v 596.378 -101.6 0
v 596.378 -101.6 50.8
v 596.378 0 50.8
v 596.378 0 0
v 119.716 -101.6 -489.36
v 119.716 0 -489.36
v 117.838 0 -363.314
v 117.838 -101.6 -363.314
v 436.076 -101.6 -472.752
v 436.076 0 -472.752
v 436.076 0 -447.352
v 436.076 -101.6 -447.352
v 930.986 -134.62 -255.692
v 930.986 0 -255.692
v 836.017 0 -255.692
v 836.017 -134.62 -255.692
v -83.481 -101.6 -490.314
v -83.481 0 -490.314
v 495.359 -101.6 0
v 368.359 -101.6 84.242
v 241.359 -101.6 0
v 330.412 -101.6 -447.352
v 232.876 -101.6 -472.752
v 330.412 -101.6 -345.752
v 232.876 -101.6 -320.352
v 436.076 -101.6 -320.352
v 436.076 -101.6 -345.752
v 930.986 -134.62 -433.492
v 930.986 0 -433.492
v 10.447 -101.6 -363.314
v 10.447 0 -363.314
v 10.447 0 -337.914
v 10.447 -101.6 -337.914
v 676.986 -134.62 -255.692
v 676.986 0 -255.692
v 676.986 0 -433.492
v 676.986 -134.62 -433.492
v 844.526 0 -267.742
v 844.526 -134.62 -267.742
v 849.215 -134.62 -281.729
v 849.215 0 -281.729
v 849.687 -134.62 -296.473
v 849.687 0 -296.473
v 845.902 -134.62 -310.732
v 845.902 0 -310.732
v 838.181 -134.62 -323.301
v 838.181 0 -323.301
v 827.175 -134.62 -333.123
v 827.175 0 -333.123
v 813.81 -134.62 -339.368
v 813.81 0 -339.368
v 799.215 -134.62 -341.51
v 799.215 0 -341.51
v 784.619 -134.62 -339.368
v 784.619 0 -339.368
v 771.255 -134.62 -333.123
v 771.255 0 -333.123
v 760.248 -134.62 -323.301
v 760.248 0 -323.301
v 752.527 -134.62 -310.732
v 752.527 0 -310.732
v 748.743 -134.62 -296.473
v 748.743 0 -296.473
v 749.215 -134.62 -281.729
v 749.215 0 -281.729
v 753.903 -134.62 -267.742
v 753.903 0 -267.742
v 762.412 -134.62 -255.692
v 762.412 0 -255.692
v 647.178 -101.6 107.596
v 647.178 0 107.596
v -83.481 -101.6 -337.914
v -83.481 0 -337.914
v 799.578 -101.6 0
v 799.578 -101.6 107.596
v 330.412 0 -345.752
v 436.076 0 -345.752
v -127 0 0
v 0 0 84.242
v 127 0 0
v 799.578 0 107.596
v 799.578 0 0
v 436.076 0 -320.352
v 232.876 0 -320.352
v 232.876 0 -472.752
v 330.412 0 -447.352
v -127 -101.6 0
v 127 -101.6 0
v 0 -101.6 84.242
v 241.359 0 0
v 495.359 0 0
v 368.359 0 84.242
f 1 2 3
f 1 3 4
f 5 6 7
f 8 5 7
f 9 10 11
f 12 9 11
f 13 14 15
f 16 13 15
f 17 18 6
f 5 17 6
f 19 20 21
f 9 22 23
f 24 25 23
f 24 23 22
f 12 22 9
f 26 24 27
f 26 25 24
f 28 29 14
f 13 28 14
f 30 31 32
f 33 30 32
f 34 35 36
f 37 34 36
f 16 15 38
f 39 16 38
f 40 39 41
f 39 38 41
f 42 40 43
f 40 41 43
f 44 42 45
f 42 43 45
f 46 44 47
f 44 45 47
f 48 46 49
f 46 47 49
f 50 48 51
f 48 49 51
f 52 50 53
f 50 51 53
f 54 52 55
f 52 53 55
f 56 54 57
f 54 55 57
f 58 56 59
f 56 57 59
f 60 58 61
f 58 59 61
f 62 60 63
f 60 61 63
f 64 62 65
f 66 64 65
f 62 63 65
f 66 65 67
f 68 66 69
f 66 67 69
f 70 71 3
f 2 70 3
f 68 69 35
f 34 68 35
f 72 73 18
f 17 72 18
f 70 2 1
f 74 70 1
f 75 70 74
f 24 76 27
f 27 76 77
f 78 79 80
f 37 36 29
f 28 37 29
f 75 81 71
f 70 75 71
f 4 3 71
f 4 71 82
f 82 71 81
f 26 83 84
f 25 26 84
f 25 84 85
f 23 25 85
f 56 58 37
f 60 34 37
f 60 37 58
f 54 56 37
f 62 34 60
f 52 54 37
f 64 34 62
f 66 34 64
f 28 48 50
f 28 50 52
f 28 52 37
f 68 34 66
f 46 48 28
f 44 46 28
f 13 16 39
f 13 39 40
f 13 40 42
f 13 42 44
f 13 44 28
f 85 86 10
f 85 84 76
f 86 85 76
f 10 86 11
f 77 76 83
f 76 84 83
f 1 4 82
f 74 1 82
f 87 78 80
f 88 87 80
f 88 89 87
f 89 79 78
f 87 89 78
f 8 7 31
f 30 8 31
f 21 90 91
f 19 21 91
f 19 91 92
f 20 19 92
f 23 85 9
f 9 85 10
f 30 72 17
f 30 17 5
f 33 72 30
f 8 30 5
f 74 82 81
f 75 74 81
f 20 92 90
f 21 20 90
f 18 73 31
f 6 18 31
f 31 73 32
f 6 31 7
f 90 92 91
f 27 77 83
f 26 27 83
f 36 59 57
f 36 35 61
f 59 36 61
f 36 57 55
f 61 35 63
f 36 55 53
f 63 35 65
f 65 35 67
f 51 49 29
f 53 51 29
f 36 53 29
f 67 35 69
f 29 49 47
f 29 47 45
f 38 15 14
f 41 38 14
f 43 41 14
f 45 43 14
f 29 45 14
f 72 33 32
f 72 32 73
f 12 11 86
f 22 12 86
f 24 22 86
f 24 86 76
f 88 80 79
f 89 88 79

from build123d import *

# Parameters (mm, degrees)
F1_DEPTH  = 101.6
F3_DEPTH  = 101.6
F4_W      = 101.6
F4_H      = 50.8
F5_DEPTH  = 101.6
F7_DEPTH  = 101.6
F9_DEPTH  = 101.6
F11_DEPTH = 101.6
F13_DEPTH = 134.62


with BuildPart() as f1:
    # F0 (on Front) → F1 (new body)
    with BuildSketch(Plane.XZ):
        Polygon((0, 84.242269675), (-127, 0), (127, 0), align=None)
    extrude(amount=F1_DEPTH)

    # F8 (on Front) → F9 (cut)
    with BuildSketch(Plane.XZ):
        Polygon((352.6244014331, -321.0040116787), (352.6244014331, -473.4040116787), (555.8244014331, -473.4040116787), (555.8244014331, -448.0040116787), (454.2244014331, -448.0040116787), (454.2244014331, -346.4040116787), (555.8244014331, -346.4040116787), (555.8244014331, -321.0040116787), align=None)
    extrude(amount=-F9_DEPTH, mode=Mode.SUBTRACT)


with BuildPart() as f3:
    # F2 (on Front) → F3 (new body)
    with BuildSketch(Plane.XZ):
        Polygon((368.3589263118, 84.242269675), (241.3589263118, 0), (495.3589263118, 0), align=None)
    extrude(amount=F3_DEPTH)


with BuildPart() as f5:
    # F4 (on Front) → F5 (new body)
    with BuildSketch(Plane.XZ):
        Polygon((596.3775763313, 50.8), (596.3775763313, 0), (697.9775763313, 0), (697.9775763313, 50.8), (647.1775763313, 107.5961266285), align=None)
        Polygon((799.5775763313, 107.5961266285), (647.1775763313, 107.5961266285), (697.9775763313, 50.8), (799.5775763313, 50.8), align=None)
        with Locations((748.7775763313, 25.4)):
            Rectangle(F4_W, F4_H)
    extrude(amount=F5_DEPTH)


with BuildPart() as f7:
    # F6 (on Front) → F7 (new body)
    with BuildSketch(Plane.XZ):
        Polygon((10.4466769844, -337.9140185932), (-83.4813854448, -337.9140185932), (-83.4813854448, -490.3140185932), (119.7163752071, -489.3600447649), (117.838434875, -363.3140185932), (10.4466769844, -363.3140185932), align=None)
    extrude(amount=F7_DEPTH)


with BuildPart() as f11:
    # F10 (on Front) → F11 (new body)
    with BuildSketch(Plane.XZ):
        Polygon((232.8759941101, -320.3524975159), (232.8759941101, -472.7524975159), (436.0759941101, -472.7524975159), (436.0759941101, -447.3524975159), (330.4120034046, -447.3524975159), (330.4120034046, -345.7524975159), (436.0759941101, -345.7524975159), (436.0759941101, -320.3524975159), align=None)
    extrude(amount=F11_DEPTH)


with BuildPart() as f13:
    # F12 (on Front) → F13 (new body)
    with BuildSketch(Plane.XZ):
        with BuildLine():
            Line((676.9858937263, -255.6922041467), (676.9858937263, -433.4922041467))
            Line((676.9858937263, -433.4922041467), (930.9858937263, -433.4922041467))
            Line((930.9858937263, -433.4922041467), (930.9858937263, -255.6922041467))
            Line((930.9858937263, -255.6922041467), (836.0171303992, -255.6922041467))
            ThreePointArc((836.0171303992, -255.6922041467), (799.2145717144, -341.5095095006), (762.4120130296, -255.6922041467))
            Line((762.4120130296, -255.6922041467), (676.9858937263, -255.6922041467))
        make_face()
    extrude(amount=F13_DEPTH)


solid = Compound([f1.part, f3.part, f5.part, f7.part, f11.part, f13.part])
